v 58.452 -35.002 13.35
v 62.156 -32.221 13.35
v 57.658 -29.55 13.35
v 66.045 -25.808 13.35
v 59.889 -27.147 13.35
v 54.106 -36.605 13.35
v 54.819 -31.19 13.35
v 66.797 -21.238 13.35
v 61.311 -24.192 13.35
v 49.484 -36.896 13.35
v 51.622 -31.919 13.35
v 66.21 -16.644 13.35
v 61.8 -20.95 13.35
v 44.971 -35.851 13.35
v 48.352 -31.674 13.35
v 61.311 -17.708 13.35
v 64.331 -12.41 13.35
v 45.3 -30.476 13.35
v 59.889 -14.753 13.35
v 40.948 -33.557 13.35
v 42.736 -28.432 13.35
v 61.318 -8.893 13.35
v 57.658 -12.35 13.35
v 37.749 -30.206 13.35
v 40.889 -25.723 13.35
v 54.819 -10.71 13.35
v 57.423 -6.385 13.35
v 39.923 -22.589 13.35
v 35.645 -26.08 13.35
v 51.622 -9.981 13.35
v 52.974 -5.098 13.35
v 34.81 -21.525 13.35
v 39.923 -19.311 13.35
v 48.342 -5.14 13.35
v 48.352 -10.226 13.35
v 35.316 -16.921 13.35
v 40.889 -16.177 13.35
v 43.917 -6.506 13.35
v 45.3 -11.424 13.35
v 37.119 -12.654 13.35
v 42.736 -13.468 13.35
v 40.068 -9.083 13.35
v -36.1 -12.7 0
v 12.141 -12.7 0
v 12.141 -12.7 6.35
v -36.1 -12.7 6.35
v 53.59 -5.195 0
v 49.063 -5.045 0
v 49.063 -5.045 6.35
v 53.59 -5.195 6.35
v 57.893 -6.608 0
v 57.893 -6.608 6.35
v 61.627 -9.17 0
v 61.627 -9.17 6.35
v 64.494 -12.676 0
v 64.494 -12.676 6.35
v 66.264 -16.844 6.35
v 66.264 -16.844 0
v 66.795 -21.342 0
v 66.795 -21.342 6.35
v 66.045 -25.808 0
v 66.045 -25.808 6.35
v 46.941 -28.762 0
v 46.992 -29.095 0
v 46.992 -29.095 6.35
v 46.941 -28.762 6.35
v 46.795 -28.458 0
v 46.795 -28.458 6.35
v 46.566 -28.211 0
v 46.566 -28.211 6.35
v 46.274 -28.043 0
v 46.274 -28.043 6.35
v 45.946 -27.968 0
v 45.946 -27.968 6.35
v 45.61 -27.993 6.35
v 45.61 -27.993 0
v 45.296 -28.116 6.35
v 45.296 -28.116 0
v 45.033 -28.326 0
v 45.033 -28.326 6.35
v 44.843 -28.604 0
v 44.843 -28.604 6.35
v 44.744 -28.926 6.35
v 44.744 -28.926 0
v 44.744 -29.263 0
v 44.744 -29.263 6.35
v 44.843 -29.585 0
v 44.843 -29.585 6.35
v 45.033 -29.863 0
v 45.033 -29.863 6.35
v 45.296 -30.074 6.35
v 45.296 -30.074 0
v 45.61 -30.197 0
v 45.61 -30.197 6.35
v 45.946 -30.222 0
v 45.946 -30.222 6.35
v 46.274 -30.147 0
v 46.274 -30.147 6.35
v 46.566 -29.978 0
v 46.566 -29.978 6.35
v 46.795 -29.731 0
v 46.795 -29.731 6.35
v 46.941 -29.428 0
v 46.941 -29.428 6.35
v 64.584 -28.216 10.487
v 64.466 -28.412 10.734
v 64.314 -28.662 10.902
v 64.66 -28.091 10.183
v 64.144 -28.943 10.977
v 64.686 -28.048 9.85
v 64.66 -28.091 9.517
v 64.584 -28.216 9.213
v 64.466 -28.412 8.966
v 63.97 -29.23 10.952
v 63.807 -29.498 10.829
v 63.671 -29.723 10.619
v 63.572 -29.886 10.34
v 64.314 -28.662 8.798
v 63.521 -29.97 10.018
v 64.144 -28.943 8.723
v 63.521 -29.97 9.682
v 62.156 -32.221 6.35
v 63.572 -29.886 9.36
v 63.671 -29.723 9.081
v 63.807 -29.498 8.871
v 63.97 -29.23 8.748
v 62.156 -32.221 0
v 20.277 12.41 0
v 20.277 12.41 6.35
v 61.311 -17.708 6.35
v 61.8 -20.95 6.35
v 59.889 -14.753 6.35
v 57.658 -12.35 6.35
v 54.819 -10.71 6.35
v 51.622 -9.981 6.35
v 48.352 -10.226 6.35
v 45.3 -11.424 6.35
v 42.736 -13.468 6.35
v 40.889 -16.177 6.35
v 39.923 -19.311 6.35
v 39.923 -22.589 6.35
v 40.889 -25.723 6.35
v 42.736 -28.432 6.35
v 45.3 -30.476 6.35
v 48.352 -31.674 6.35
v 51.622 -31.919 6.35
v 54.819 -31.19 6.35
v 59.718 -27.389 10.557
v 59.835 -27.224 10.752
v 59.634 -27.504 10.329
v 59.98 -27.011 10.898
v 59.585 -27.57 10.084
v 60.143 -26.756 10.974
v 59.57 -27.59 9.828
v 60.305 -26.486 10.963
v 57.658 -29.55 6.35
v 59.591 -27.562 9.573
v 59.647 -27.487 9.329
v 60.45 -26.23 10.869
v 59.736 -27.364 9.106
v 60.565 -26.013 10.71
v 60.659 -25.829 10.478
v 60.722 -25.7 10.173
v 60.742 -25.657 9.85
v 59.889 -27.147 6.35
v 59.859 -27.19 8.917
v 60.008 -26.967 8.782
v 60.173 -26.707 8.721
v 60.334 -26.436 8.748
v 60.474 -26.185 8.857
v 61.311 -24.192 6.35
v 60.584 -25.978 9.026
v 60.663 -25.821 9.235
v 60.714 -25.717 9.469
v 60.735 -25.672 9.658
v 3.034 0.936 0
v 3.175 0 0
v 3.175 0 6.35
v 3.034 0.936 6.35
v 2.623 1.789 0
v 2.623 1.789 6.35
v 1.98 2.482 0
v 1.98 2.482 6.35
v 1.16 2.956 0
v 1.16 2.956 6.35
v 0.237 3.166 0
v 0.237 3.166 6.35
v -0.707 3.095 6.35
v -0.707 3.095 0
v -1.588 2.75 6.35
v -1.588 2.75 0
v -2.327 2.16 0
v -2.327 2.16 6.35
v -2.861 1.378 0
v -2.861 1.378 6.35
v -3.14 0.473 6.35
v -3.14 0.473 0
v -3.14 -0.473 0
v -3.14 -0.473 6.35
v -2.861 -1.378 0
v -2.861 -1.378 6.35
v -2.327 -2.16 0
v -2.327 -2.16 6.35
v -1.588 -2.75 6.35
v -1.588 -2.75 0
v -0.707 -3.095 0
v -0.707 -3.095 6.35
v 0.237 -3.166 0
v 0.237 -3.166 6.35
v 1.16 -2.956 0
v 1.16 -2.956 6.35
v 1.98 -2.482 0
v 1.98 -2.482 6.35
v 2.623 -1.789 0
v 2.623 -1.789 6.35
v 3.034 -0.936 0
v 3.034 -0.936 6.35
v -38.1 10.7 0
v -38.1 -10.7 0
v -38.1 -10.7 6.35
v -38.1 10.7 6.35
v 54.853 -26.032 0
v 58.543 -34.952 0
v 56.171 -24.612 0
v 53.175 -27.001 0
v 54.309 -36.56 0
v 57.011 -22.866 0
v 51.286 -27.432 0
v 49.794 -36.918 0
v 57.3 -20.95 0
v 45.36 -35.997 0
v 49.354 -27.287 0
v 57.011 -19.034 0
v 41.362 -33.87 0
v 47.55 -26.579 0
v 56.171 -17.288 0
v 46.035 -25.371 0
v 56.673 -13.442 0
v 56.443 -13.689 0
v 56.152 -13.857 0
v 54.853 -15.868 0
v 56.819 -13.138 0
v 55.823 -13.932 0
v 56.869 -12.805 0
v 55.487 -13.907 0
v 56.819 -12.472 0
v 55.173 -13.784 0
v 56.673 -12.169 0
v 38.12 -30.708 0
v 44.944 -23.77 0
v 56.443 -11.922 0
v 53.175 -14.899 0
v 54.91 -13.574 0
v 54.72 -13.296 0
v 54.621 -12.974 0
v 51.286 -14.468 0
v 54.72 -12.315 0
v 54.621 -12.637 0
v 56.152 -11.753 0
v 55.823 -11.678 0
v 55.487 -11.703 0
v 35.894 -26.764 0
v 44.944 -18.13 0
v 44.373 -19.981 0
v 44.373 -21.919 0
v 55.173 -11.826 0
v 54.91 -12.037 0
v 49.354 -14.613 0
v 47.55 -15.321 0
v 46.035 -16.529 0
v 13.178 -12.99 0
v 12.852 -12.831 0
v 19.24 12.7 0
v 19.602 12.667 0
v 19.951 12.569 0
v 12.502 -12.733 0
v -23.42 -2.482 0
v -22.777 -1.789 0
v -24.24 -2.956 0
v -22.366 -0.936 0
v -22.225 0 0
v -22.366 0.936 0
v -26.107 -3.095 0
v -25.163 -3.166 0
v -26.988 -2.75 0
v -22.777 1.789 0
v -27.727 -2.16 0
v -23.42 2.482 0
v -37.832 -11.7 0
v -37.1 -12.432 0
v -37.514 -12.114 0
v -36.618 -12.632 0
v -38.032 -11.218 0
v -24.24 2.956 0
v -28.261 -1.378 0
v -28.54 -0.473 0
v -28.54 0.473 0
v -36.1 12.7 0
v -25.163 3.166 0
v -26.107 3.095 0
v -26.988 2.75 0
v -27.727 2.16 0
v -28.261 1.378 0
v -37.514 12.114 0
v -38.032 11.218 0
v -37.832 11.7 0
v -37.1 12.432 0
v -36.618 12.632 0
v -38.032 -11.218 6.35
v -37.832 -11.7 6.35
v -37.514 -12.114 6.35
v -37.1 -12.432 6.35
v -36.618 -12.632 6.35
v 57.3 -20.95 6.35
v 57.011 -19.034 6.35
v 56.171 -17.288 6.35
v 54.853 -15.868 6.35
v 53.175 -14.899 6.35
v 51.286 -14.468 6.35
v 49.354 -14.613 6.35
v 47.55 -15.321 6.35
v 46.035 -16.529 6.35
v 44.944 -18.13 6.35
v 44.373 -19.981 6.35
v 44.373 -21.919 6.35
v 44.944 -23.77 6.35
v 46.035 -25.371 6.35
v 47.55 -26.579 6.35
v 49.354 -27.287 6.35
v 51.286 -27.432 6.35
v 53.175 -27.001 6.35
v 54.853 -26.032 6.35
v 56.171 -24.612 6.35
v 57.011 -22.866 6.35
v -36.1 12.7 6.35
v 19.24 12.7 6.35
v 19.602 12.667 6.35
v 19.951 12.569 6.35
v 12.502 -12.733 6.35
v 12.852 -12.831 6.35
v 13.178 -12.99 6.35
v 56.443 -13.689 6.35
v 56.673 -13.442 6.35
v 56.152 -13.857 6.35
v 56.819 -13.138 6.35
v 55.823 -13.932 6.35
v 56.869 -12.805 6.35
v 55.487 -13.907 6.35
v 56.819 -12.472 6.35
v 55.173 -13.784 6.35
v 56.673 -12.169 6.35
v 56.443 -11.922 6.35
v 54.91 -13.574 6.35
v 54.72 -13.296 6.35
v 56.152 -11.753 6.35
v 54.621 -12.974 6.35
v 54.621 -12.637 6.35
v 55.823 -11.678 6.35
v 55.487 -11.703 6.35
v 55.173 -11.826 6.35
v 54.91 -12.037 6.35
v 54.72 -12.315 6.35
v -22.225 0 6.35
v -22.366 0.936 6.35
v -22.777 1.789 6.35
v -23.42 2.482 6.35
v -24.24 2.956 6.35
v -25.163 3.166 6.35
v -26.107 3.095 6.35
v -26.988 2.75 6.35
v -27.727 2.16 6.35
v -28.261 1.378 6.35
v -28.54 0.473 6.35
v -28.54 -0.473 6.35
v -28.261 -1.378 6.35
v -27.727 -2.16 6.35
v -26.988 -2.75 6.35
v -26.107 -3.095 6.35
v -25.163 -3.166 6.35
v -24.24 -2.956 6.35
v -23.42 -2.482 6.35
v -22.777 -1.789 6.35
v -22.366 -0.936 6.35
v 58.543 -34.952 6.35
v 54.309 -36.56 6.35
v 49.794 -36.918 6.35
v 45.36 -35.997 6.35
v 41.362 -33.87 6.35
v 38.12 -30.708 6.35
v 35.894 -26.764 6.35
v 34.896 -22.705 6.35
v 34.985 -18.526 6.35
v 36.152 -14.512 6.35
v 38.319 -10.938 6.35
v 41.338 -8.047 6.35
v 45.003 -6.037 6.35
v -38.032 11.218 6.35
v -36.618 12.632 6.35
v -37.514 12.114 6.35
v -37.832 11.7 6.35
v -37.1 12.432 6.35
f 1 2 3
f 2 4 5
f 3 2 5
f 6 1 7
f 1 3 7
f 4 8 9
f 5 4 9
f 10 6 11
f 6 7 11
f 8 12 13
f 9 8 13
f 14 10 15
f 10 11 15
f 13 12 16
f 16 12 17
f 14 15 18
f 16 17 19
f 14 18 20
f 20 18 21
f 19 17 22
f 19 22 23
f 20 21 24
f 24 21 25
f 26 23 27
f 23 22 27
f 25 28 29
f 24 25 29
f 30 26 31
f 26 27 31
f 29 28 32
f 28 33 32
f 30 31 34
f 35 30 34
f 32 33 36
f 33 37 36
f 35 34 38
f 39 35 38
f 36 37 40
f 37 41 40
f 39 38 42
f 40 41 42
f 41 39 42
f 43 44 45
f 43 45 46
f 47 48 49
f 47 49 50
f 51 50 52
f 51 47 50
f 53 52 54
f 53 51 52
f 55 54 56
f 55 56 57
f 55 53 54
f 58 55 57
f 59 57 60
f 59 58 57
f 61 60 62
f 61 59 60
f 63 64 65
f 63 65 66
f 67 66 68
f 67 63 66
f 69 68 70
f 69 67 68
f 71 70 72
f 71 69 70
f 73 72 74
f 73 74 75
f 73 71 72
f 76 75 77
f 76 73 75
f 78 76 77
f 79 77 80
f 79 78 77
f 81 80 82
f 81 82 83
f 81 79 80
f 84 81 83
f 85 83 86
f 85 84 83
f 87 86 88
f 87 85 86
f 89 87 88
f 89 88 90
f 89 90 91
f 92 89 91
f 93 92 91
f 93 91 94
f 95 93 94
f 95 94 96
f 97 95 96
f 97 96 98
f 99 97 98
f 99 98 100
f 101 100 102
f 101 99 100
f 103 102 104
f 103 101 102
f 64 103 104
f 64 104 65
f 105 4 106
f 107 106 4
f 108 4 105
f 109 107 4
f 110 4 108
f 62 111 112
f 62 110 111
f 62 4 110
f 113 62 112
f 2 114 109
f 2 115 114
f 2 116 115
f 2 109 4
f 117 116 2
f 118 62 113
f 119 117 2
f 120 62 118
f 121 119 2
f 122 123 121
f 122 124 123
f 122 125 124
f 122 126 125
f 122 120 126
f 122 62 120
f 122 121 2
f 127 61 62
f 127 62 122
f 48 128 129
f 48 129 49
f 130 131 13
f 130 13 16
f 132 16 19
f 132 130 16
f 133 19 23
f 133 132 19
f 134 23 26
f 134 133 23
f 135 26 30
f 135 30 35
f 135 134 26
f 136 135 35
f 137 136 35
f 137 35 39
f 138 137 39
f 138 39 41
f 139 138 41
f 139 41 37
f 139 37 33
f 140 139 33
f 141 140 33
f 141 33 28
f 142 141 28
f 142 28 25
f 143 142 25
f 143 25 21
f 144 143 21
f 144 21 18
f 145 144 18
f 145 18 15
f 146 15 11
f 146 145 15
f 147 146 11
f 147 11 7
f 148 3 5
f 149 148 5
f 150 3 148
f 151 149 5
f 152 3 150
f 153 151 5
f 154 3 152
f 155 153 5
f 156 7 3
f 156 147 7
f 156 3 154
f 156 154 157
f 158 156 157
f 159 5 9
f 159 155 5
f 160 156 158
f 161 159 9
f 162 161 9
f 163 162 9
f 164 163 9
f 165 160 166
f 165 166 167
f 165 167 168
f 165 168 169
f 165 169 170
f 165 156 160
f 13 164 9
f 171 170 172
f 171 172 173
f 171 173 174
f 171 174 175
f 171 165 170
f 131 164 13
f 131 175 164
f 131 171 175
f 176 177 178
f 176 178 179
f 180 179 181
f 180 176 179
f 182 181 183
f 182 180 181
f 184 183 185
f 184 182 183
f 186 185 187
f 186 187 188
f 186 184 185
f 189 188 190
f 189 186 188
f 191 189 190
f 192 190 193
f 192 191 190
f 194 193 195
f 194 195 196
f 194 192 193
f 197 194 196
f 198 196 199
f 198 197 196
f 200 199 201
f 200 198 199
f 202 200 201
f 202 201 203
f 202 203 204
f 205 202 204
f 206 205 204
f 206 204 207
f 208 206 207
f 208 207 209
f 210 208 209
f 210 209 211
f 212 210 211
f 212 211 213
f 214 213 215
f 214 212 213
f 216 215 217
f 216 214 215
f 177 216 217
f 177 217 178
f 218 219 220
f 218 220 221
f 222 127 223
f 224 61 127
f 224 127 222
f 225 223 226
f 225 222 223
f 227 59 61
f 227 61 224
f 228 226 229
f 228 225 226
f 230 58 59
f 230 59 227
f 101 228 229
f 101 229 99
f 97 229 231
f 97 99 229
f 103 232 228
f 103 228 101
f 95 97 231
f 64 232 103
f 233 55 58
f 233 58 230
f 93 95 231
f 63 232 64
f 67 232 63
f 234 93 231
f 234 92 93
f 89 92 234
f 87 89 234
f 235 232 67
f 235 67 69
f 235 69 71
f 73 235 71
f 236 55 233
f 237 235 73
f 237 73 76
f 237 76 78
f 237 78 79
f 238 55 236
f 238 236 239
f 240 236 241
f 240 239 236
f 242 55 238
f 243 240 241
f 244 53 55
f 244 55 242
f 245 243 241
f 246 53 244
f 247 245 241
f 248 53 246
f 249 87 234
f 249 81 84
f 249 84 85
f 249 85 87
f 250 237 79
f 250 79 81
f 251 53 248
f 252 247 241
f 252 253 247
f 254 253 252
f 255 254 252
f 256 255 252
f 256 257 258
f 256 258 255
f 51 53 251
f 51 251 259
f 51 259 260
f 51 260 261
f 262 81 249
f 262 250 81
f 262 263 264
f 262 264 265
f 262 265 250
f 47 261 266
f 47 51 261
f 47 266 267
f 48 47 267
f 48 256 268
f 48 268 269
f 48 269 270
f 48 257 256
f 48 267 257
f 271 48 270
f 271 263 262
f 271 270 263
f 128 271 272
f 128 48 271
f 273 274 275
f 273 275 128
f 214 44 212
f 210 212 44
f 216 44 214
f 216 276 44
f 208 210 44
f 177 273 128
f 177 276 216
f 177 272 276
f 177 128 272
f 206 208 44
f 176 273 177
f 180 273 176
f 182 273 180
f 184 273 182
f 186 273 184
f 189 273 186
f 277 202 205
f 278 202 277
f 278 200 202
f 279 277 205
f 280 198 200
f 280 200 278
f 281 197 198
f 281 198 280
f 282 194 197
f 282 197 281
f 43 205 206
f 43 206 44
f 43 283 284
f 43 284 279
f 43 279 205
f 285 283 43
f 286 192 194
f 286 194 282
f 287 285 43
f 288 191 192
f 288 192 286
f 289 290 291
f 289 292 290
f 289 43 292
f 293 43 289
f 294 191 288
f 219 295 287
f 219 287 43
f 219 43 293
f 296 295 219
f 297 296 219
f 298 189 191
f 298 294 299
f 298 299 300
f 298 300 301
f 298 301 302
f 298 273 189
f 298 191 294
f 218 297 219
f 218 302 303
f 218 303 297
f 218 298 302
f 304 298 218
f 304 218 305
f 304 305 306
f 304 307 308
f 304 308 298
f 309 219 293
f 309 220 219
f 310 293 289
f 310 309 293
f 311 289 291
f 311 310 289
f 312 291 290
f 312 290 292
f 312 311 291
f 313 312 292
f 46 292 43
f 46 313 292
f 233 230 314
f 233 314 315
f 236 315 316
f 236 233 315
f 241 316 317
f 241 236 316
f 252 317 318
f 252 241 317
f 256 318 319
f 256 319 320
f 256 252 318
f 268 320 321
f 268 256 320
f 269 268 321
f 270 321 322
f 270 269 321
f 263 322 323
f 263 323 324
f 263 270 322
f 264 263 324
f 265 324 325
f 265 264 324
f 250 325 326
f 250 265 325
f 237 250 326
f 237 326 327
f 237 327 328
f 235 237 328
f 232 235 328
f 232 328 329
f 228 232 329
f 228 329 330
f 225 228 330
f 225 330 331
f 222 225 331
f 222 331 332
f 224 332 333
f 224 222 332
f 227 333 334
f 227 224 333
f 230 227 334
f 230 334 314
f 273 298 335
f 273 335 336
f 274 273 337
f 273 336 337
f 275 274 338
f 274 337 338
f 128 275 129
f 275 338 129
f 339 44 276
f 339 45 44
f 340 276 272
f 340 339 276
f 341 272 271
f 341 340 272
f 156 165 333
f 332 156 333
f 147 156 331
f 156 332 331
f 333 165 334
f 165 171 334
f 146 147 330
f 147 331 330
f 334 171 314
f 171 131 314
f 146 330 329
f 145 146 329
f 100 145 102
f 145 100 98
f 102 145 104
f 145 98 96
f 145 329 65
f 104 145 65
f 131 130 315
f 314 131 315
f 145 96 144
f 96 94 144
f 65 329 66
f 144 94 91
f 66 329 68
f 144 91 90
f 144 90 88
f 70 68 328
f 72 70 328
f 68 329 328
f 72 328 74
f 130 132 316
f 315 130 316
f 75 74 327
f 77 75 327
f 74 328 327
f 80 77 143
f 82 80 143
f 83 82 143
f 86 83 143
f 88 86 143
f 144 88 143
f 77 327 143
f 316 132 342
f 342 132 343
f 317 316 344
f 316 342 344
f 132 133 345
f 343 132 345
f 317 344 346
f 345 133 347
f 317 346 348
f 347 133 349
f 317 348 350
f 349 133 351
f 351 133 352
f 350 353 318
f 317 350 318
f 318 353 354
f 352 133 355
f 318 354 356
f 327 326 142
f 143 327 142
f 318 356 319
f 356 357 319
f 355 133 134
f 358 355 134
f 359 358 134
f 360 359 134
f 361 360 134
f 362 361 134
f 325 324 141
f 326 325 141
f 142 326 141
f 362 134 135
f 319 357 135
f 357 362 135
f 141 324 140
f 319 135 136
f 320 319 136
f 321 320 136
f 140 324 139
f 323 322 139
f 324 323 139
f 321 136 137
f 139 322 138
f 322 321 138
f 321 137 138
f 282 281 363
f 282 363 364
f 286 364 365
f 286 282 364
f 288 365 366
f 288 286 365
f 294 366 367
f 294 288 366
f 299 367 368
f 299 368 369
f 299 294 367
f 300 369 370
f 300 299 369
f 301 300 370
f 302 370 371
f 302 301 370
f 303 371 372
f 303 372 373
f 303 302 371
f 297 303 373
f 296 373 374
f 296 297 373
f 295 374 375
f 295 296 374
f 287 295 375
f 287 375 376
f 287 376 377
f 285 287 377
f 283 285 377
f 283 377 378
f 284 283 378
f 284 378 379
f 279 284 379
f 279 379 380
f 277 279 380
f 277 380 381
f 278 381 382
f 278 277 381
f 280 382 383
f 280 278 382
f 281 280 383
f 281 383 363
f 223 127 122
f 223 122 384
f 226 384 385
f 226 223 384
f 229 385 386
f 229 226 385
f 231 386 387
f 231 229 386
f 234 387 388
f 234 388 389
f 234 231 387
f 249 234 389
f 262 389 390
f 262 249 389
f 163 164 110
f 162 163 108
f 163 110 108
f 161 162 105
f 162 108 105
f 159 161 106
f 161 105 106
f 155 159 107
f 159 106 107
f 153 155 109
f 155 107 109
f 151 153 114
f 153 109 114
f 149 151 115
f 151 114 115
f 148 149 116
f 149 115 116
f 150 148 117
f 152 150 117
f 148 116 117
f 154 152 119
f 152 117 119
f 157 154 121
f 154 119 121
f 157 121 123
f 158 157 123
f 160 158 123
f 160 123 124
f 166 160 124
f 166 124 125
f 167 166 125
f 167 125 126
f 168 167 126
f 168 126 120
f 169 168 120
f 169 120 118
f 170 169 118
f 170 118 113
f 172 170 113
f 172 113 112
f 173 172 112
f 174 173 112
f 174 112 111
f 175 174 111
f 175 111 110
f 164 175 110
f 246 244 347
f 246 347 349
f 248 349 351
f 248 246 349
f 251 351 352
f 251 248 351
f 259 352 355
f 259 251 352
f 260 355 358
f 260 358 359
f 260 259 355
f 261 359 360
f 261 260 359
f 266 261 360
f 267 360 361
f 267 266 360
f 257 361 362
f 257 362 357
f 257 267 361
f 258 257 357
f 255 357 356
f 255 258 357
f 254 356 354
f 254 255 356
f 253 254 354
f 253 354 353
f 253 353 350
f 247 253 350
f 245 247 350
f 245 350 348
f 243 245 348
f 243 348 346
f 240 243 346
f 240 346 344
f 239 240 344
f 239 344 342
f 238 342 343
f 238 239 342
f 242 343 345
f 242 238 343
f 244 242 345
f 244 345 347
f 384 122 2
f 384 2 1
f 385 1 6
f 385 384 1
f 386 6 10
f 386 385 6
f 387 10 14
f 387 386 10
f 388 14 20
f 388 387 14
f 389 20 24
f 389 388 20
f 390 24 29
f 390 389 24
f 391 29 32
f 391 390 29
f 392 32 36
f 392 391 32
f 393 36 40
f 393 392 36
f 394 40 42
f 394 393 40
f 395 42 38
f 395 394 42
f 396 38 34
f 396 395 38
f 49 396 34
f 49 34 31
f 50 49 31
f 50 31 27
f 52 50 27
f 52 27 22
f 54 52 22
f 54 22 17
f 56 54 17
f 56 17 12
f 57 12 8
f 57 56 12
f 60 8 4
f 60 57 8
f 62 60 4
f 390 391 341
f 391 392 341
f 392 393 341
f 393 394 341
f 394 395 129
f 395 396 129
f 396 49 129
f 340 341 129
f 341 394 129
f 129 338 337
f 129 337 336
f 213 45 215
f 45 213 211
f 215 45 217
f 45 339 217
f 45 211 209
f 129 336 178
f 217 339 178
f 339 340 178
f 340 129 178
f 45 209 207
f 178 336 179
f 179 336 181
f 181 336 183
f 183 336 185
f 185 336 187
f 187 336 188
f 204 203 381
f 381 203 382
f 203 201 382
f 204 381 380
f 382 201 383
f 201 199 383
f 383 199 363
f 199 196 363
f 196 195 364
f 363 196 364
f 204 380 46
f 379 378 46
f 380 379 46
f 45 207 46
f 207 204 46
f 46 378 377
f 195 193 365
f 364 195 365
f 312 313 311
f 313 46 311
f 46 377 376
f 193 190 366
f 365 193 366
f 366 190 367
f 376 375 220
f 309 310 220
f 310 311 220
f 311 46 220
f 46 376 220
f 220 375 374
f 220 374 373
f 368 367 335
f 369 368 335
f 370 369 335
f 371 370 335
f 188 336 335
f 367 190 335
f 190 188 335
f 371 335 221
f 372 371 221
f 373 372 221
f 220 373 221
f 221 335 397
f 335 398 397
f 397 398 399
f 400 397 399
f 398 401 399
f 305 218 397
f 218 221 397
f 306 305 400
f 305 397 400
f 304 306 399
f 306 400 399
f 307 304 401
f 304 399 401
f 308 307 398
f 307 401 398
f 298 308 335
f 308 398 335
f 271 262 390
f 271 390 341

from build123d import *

# Parameters (mm, degrees)
SKETCH1_R               = 3.175
SKETCH1_R_2             = 6.5
SKETCH1_R_3             = 1.1303
BOSS_EXTRUDE1_DEPTH     = 6.35
FILLET3_R               = 2
SKETCH4_R               = 11
BOSS_EXTRUDE2_DEPTH     = 7
CUT_EXTRUDE1_REACH      = 112.192
CUT_EXTRUDE1_END_RADIUS = 11
SKETCH2_R               = 1.1303


with BuildPart() as part:
    # Sketch1 → Boss-Extrude1 (new body)
    with BuildSketch(Plane.XY):
        with BuildLine():
            Line((-38.1, -12.7), (-38.1, 12.7))
            Line((-38.1, 12.7), (19.799208724, 12.7))
            Line((19.799208724, 12.7), (49.063216326, -5.044542368))
            ThreePointArc((49.063216326, -5.044542368), (63.185378941, -10.82071629), (66.044603929, -25.808194216))
            Line((66.044603929, -25.808194216), (62.155933896, -32.221324916))
            ThreePointArc((62.155933896, -32.221324916), (47.544550454, -36.615313538), (35.893587146, -26.763678338))
            Line((35.893587146, -26.763678338), (12.7, -12.7))
            Line((12.7, -12.7), (-38.1, -12.7))
        make_face()
        with Locations((-25.4, 0)):
            Circle(SKETCH1_R, mode=Mode.SUBTRACT)
        Circle(SKETCH1_R, mode=Mode.SUBTRACT)
        with Locations((50.8, -20.95)):
            Circle(SKETCH1_R_2, mode=Mode.SUBTRACT)
        with Locations((55.738610942, -12.805324011)):
            Circle(SKETCH1_R_3, mode=Mode.SUBTRACT)
        with Locations((45.861389058, -29.094675989)):
            Circle(SKETCH1_R_3, mode=Mode.SUBTRACT)
    extrude(amount=BOSS_EXTRUDE1_DEPTH)

    # Fillet3
    fillet3_edges = [part.edges().sort_by_distance(p)[0] for p in [
        (-38.1, -12.7, 3.175),
        (-38.1, 12.7, 3.175),
        (19.799208724, 12.7, 3.175),
        (12.7, -12.7, 3.175),
    ]]
    fillet(fillet3_edges, radius=FILLET3_R)

    # Sketch4 → Boss-Extrude2 (add)
    with BuildSketch(Plane.XY.offset(6.35)):
        with BuildLine():
            Line((66.044603929, -25.808194216), (62.155933896, -32.221324916))
            ThreePointArc((62.155933896, -32.221324916), (37.118654507, -12.654170595), (66.044603929, -25.808194216))
        make_face()
        with Locations((50.8, -20.95)):
            Circle(SKETCH4_R, mode=Mode.SUBTRACT)
    extrude(amount=BOSS_EXTRUDE2_DEPTH)

    # Cut-Extrude1: up to this cylinder (the profile starts outside it)
    cut_extrude1_end = Plane(origin=(50.8, -20.95, 9.85), z_dir=(0, 0, -1)) * Cylinder(CUT_EXTRUDE1_END_RADIUS, 247.384, mode=Mode.PRIVATE)
    # Sketch2 → Cut-Extrude1 (cut, up to the surface)
    with BuildSketch(Plane(origin=(59.73186838, -36.21905392, 0), x_dir=(0, 0, -1), z_dir=(0.8550840932924629, -0.5184893377864258, 0)), mode=Mode.PRIVATE) as cut_extrude1_sk1:
        with Locations(Location((-9.85, 8.425246605, 0), (0, 0, 90))):
            Circle(SKETCH2_R)
    cut_extrude1_tool1 = extrude(cut_extrude1_sk1.sketch, amount=-CUT_EXTRUDE1_REACH, mode=Mode.PRIVATE) - cut_extrude1_end
    add(cut_extrude1_tool1.solids().sort_by_distance((64.100269, -29.01476, 9.85))[0], mode=Mode.SUBTRACT)


solid = part.part
